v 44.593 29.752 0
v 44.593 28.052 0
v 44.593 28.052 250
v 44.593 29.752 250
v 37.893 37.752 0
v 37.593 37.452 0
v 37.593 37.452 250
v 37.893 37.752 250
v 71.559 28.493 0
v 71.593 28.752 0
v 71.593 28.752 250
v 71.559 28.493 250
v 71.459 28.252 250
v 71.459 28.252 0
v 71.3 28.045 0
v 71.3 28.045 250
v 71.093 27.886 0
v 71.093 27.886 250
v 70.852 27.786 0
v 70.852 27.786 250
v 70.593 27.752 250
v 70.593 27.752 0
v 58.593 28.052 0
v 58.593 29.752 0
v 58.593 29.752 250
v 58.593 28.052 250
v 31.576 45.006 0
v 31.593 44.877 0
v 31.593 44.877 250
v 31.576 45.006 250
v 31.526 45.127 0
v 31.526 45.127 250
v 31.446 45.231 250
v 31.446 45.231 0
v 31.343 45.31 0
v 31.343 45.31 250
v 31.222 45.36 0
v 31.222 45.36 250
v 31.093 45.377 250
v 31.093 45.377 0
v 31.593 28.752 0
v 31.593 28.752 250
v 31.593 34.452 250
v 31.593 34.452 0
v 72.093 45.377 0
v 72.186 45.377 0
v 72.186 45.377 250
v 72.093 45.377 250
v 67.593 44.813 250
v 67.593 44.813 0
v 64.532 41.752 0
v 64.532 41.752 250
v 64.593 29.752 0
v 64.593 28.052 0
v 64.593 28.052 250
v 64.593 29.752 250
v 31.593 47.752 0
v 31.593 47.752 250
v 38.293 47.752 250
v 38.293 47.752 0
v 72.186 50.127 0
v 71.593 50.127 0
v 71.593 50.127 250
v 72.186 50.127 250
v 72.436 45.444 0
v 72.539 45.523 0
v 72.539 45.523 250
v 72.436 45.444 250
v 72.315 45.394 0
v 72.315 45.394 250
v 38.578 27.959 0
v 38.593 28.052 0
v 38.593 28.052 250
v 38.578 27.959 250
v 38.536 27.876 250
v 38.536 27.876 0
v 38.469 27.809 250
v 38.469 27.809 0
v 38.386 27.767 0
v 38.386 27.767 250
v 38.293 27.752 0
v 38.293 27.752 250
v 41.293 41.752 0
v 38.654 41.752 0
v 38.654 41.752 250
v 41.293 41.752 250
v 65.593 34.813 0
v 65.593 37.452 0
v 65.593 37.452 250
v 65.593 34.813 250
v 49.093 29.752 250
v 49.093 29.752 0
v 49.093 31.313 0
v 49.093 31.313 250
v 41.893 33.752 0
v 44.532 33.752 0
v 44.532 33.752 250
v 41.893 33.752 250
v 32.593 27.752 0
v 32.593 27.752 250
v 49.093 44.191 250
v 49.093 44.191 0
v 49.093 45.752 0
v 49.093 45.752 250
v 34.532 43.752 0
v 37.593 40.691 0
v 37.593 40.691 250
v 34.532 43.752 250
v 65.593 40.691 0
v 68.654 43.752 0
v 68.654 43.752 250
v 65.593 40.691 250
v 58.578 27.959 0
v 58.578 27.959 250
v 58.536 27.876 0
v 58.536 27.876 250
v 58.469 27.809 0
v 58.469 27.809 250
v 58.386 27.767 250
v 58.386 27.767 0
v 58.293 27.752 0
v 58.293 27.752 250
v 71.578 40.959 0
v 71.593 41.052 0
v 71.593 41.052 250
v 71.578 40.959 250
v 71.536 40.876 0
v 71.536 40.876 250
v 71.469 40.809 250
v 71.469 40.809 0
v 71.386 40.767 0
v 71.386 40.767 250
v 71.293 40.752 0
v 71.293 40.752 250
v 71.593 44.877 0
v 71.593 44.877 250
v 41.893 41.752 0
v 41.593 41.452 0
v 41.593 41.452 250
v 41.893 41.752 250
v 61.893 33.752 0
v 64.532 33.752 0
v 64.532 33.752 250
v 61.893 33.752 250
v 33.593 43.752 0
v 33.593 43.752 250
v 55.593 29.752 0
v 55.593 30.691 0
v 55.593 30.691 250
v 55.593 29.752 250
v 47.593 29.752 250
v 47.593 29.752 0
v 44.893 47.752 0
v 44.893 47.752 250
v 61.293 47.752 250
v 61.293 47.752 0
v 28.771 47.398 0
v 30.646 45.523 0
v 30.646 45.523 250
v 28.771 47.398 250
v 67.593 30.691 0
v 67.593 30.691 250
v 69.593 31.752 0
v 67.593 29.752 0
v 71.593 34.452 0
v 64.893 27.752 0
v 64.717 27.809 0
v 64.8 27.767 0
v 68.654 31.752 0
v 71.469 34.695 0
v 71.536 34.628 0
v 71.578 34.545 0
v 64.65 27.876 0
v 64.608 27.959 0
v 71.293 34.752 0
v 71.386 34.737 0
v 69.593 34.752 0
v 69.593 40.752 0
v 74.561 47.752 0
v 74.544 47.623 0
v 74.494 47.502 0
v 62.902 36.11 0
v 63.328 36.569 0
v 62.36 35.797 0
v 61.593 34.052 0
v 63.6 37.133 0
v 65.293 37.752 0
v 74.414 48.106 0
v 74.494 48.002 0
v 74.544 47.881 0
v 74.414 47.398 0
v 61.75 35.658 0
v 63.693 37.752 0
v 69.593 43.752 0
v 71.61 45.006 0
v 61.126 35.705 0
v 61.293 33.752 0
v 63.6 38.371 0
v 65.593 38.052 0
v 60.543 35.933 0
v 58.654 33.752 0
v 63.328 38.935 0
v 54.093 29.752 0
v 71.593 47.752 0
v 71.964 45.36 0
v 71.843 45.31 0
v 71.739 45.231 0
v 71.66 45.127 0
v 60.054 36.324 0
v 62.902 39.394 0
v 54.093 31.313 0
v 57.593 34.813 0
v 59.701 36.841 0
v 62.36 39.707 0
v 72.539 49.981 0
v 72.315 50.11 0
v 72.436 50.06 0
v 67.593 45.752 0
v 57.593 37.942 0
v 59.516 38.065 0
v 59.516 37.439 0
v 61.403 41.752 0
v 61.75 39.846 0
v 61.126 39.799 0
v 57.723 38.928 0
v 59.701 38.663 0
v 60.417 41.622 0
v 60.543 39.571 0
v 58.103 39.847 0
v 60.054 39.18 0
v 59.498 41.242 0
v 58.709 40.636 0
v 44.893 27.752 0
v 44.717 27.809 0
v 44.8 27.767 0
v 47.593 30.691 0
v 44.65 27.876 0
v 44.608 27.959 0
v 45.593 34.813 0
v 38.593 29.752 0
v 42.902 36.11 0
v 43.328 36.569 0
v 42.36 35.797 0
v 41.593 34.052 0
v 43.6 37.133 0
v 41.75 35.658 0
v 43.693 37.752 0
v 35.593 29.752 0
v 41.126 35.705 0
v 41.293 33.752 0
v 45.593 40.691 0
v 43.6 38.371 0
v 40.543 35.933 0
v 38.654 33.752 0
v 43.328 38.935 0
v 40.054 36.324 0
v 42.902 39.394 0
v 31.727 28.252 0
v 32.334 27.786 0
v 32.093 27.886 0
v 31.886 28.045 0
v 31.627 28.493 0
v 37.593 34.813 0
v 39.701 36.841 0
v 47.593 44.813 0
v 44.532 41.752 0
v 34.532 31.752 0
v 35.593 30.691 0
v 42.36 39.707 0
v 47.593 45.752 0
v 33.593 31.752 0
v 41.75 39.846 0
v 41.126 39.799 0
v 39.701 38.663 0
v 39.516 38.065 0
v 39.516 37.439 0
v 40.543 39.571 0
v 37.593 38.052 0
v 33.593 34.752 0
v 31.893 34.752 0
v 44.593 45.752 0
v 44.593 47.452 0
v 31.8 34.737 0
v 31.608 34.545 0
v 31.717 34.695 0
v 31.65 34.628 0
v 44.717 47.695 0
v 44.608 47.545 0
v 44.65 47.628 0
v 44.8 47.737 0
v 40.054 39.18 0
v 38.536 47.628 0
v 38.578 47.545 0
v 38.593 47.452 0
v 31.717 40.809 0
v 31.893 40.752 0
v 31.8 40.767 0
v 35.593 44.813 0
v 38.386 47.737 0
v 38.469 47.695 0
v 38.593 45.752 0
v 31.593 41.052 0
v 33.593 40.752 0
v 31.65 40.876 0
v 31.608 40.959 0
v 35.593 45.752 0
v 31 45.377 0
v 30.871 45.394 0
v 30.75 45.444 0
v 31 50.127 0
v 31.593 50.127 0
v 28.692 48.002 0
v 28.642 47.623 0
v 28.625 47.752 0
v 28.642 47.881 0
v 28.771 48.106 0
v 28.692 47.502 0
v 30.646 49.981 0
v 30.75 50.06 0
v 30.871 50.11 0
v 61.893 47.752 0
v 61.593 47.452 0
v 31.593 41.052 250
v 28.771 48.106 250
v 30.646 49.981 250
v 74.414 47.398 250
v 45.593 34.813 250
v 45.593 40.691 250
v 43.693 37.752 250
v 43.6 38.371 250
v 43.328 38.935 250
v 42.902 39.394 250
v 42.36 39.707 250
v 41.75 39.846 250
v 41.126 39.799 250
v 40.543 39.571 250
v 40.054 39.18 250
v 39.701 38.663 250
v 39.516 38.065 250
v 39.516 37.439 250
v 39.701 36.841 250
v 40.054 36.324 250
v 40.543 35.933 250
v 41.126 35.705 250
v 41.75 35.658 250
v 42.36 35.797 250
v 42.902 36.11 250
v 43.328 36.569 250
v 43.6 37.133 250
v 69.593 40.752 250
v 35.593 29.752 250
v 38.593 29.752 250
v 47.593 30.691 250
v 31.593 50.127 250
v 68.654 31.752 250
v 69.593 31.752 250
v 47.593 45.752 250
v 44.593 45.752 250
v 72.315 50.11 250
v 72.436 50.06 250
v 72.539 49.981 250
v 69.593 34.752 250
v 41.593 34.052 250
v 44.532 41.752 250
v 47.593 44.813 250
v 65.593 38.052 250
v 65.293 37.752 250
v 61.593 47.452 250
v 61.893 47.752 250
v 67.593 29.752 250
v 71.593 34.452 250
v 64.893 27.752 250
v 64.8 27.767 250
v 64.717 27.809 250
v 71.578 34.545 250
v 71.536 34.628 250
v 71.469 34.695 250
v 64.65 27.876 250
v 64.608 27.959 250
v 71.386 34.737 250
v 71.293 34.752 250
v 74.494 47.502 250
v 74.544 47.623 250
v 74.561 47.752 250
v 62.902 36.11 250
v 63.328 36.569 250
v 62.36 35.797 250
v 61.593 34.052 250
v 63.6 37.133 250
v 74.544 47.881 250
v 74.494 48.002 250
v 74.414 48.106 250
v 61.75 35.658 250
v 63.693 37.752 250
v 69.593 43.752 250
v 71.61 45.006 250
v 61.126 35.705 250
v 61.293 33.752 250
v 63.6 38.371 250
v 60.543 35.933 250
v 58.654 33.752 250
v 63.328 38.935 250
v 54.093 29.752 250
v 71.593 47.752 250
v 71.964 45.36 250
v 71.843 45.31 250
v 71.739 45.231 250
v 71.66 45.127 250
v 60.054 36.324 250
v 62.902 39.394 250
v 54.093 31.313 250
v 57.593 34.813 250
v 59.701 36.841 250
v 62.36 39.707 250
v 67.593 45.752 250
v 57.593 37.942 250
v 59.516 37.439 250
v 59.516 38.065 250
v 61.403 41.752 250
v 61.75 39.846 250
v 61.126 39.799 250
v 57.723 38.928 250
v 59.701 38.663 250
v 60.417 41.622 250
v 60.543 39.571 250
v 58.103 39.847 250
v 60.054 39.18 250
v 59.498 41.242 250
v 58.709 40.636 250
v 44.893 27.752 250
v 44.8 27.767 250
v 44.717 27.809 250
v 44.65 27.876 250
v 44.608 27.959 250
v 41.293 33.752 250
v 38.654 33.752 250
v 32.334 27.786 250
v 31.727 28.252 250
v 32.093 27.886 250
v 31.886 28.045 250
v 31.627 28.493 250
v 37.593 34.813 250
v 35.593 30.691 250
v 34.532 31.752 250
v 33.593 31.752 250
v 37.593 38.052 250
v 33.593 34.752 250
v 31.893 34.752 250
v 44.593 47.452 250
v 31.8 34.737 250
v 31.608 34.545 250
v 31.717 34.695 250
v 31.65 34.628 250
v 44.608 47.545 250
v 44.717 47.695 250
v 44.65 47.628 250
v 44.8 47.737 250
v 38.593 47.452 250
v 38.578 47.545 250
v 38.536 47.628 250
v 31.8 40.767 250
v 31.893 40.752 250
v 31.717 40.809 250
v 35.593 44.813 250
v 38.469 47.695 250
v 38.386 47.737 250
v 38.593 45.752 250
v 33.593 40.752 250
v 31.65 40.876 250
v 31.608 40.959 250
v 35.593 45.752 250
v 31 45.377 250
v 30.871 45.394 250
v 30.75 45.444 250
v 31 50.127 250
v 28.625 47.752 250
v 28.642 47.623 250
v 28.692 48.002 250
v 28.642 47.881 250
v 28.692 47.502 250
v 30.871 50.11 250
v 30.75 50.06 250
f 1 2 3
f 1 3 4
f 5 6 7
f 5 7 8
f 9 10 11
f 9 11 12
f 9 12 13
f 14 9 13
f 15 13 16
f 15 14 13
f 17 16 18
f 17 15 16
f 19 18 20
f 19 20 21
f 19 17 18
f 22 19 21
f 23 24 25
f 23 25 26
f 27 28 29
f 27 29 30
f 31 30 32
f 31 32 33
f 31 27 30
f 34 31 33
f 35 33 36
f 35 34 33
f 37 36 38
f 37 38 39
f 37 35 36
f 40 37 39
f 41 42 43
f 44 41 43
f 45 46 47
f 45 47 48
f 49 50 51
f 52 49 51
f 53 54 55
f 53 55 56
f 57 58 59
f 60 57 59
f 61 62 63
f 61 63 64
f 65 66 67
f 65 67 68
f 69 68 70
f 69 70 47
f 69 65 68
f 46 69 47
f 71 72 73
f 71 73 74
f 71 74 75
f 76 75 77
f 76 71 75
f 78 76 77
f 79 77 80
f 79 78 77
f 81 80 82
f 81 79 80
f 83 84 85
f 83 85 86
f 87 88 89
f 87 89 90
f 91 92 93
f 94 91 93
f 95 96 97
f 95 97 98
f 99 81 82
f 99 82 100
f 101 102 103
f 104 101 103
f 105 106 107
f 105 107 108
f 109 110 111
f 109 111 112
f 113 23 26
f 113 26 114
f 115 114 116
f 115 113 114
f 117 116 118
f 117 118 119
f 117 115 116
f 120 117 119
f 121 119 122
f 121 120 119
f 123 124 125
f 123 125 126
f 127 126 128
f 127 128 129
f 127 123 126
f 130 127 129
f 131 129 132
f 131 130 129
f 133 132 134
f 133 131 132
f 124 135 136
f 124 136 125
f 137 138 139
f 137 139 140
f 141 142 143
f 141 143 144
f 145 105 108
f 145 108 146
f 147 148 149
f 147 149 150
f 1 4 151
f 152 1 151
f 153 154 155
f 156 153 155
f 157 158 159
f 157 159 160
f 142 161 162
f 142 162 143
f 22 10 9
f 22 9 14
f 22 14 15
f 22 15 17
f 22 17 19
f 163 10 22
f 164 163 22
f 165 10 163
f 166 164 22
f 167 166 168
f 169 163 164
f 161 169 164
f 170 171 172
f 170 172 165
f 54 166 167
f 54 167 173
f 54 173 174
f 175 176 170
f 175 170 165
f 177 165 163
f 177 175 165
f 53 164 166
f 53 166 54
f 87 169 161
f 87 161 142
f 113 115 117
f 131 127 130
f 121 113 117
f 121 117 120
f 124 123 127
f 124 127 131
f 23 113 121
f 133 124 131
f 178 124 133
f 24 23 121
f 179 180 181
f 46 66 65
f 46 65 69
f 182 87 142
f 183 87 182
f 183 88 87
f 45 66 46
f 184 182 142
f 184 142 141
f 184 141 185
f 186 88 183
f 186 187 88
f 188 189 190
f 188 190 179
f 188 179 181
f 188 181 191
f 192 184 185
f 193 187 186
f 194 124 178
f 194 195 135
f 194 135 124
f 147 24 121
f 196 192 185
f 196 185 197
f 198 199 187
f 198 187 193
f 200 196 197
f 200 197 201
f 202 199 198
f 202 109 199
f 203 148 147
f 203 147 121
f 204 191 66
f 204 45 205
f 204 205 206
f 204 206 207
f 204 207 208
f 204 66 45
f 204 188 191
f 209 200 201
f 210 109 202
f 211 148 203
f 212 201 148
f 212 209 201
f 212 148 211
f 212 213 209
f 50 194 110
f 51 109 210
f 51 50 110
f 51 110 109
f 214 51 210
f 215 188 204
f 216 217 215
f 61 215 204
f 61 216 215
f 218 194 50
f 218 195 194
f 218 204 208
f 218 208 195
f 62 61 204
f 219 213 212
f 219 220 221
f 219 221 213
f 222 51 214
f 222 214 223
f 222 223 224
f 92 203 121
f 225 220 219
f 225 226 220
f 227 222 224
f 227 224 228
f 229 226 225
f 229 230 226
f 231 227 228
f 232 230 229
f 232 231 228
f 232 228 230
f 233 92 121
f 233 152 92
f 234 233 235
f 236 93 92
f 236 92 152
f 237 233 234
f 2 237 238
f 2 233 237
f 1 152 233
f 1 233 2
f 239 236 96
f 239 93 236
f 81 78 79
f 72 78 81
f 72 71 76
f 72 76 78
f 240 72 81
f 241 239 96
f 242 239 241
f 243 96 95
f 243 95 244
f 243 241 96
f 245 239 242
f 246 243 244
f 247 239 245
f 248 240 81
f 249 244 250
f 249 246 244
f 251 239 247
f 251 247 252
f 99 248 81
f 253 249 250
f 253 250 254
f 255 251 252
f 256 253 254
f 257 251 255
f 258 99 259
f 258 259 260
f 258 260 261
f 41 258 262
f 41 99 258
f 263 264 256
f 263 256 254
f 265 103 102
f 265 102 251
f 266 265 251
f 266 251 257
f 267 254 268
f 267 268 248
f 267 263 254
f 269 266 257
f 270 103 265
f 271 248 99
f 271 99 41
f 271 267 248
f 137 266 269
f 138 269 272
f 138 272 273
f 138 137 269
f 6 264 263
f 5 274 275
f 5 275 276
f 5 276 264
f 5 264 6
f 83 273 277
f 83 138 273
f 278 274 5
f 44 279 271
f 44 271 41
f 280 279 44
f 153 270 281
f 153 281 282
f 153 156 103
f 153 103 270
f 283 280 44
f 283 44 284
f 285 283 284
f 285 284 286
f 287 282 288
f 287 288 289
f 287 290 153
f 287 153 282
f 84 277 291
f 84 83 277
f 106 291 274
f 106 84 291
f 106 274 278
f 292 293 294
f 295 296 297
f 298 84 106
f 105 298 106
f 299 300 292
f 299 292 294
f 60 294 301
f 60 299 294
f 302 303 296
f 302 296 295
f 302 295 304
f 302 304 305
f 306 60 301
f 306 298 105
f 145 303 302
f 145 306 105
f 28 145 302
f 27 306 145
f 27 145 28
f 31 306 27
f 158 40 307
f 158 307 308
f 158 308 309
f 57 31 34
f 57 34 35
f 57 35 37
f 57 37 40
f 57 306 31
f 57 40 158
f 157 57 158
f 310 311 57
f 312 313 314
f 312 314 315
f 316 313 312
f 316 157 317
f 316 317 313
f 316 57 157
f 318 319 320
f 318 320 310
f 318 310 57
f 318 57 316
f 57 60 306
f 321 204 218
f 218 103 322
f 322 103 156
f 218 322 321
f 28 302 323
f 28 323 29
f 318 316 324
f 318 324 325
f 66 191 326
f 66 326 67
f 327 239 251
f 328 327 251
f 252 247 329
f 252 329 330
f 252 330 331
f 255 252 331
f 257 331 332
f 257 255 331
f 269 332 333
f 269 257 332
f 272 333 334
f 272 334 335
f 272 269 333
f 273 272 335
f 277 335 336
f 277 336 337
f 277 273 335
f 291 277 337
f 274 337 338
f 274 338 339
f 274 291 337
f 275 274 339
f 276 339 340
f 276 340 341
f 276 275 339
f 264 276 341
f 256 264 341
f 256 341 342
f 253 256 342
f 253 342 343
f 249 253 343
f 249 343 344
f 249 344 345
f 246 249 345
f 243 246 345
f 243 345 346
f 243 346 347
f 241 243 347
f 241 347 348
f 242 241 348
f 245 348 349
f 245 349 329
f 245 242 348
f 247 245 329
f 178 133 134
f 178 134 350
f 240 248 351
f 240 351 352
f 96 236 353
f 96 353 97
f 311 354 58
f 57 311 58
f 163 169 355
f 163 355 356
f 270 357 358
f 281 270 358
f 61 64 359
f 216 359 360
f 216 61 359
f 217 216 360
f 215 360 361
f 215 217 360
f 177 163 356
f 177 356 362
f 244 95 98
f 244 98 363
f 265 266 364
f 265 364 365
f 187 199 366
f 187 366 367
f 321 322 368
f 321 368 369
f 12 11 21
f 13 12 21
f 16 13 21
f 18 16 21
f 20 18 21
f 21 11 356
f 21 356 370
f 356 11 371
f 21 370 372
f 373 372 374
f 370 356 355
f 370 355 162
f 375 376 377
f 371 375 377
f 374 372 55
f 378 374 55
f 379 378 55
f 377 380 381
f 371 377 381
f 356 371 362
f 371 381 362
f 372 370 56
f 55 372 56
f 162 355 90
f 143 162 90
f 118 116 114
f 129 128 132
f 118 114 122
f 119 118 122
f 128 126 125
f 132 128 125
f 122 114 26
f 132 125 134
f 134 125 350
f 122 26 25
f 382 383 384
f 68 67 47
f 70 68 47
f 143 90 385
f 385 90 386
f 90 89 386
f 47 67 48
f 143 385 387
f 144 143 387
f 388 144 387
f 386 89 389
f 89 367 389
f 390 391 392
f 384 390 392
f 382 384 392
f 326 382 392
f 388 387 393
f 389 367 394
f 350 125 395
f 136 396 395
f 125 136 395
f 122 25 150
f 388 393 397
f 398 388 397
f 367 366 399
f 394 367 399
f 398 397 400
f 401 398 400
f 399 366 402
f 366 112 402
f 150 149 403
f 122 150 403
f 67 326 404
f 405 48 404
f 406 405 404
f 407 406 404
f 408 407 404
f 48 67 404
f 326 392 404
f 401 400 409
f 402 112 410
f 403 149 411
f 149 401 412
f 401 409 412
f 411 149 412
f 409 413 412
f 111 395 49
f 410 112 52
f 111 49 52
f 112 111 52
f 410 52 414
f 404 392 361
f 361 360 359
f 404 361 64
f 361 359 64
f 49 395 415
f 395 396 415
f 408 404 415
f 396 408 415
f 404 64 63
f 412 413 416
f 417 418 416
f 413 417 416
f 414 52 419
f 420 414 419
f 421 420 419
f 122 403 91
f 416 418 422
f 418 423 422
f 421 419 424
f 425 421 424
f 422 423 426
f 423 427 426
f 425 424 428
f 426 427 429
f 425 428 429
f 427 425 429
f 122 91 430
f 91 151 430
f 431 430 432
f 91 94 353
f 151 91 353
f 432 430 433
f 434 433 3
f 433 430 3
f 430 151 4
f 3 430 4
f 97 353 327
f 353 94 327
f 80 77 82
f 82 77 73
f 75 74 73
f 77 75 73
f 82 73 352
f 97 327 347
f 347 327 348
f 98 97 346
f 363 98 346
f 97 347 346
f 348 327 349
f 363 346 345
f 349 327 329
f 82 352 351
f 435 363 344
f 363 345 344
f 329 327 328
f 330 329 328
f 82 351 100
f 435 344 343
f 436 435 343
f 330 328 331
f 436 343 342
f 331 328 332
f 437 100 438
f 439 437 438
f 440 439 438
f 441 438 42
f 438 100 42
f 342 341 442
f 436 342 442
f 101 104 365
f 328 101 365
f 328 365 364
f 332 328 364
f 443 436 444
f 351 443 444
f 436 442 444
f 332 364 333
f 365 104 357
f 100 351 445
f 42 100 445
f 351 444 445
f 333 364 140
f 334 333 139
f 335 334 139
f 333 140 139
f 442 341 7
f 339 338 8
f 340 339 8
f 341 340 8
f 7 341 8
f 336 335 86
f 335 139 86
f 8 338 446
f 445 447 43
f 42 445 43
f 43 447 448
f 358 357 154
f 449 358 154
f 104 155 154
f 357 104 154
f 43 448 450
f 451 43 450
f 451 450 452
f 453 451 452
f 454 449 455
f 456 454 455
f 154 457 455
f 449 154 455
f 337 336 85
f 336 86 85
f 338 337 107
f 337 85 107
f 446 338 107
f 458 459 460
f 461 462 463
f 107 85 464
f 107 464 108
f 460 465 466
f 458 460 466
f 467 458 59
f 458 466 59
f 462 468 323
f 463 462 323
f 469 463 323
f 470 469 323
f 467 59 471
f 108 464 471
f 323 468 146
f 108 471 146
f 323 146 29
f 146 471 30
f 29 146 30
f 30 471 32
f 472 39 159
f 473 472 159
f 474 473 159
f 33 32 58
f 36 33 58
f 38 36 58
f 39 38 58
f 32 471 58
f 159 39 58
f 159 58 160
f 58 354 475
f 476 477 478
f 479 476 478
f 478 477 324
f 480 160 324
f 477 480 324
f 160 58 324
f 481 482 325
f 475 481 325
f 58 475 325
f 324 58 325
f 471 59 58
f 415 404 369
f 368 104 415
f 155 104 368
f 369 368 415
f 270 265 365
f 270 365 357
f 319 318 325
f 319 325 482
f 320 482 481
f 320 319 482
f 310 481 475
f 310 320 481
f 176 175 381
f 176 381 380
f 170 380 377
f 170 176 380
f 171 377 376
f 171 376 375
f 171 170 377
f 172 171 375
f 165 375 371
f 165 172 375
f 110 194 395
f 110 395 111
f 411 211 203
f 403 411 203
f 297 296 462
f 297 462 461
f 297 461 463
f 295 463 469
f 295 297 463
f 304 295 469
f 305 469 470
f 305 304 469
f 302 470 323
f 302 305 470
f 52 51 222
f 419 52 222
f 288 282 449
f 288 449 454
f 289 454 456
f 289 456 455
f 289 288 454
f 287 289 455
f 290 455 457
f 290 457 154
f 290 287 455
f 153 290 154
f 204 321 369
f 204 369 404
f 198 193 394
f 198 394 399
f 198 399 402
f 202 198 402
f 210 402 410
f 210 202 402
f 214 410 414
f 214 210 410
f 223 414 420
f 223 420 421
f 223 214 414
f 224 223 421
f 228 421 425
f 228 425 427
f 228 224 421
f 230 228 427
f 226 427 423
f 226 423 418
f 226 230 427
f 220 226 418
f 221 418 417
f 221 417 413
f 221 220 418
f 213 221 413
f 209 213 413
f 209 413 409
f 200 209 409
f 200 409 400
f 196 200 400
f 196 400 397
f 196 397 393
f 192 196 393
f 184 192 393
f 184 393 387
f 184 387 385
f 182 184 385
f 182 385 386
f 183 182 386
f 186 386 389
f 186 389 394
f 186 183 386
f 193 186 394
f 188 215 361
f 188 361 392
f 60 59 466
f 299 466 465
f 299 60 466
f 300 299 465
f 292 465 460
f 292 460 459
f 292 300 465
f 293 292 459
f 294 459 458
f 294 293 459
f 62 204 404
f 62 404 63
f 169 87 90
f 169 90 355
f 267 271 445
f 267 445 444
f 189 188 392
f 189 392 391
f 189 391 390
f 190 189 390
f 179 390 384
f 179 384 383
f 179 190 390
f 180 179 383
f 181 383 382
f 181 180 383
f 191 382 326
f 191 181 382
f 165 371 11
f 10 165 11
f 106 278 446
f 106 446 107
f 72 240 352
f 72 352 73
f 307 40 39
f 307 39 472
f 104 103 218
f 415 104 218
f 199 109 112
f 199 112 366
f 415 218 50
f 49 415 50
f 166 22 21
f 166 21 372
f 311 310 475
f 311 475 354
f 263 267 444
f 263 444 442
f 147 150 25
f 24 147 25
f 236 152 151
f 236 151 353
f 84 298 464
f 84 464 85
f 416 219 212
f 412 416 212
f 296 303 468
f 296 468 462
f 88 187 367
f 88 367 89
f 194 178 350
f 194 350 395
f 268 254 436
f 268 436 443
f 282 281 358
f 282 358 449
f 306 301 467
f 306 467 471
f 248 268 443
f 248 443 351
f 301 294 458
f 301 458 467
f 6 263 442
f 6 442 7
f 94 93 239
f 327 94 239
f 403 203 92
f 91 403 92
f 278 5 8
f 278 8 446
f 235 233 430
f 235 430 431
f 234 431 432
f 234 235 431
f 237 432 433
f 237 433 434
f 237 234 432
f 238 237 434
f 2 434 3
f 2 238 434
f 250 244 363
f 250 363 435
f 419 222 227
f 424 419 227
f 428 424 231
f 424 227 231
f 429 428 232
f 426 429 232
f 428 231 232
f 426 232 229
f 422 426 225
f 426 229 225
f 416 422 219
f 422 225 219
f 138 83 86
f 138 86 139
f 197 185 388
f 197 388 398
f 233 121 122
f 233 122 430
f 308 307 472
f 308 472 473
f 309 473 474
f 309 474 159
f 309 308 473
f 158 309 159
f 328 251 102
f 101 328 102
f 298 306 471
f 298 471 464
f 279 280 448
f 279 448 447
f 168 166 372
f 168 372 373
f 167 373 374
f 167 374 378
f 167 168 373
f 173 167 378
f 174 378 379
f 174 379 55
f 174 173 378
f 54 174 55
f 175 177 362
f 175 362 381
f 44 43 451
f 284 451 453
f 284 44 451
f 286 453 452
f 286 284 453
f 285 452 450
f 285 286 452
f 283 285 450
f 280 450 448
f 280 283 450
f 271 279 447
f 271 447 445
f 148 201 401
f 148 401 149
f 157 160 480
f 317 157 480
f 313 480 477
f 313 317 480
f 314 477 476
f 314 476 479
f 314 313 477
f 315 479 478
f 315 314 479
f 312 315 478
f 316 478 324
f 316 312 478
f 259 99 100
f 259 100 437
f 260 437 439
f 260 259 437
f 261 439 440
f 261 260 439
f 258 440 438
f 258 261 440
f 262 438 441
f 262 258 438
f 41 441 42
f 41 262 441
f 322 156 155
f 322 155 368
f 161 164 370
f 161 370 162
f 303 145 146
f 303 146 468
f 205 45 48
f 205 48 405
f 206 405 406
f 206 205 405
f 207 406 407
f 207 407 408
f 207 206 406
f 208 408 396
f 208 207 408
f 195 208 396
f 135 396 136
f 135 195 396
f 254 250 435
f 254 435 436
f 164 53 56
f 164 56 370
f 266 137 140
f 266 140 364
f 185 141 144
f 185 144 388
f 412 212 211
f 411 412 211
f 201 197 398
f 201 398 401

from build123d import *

# Parameters (mm, degrees)
MODEL_R             = 2.100000001
BOSS_EXTRUDE1_DEPTH = 250


with BuildPart() as part:
    # Model → Boss-Extrude1 (new body)
    with BuildSketch(Plane.XY):
        with BuildLine():
            Line((28.771485975, 48.105572105), (30.646485975, 49.980572105))
            ThreePointArc((30.646485975, 49.980572105), (30.808697649, 50.08895848), (31.000039365, 50.127018713))
            Line((31.000039365, 50.127018713), (31.592932584, 50.127018713))
            Line((31.592932584, 50.127018713), (31.592932584, 47.752018713))
            Line((31.592932584, 47.752018713), (38.292932585, 47.752018713))
            ThreePointArc((38.292932585, 47.752018713), (38.505064619, 47.664150748), (38.592932584, 47.452018714))
            Line((38.592932584, 47.452018714), (38.592932584, 45.752018713))
            Line((38.592932584, 45.752018713), (35.592932585, 45.752018713))
            Line((35.592932585, 45.752018713), (35.592932585, 44.812678885))
            Line((35.592932585, 44.812678885), (38.653592756, 41.752018713))
            Line((38.653592756, 41.752018713), (41.292932583, 41.752018713))
            Line((41.292932583, 41.752018713), (41.592932584, 41.452018713))
            Line((41.592932584, 41.452018713), (41.892932586, 41.752018714))
            Line((41.892932586, 41.752018714), (44.532272412, 41.752018714))
            Line((44.532272412, 41.752018714), (47.592932584, 44.812678886))
            Line((47.592932584, 44.812678886), (47.592932584, 45.752018714))
            Line((47.592932584, 45.752018714), (44.592932584, 45.752018714))
            Line((44.592932584, 45.752018714), (44.592932584, 47.452018715))
            ThreePointArc((44.592932584, 47.452018715), (44.68080055, 47.664150749), (44.892932584, 47.752018715))
            Line((44.892932584, 47.752018715), (61.292932583, 47.752018715))
            Line((61.292932583, 47.752018715), (61.592932582, 47.452018715))
            Line((61.592932582, 47.452018715), (61.892932583, 47.752018716))
            Line((61.892932583, 47.752018716), (71.592932583, 47.752018716))
            Line((71.592932583, 47.752018716), (71.592932583, 50.127018711))
            Line((71.592932583, 50.127018711), (72.185825802, 50.127018711))
            ThreePointArc((72.185825802, 50.127018711), (72.377167518, 50.088958477), (72.539379192, 49.980572102))
            Line((72.539379192, 49.980572102), (74.414379192, 48.105572102))
            ThreePointArc((74.414379192, 48.105572102), (74.560825801, 47.752018712), (74.414379192, 47.398465322))
            Line((74.414379192, 47.398465322), (72.539379192, 45.523465322))
            ThreePointArc((72.539379192, 45.523465322), (72.377167518, 45.415078947), (72.185825802, 45.377018714))
            Line((72.185825802, 45.377018714), (72.092932582, 45.377018714))
            ThreePointArc((72.092932582, 45.377018714), (71.739379192, 45.230572103), (71.592932583, 44.877018713))
            Line((71.592932583, 44.877018713), (71.592932583, 41.052018712))
            ThreePointArc((71.592932583, 41.052018712), (71.505064617, 40.839886678), (71.292932581, 40.752018713))
            Line((71.292932581, 40.752018713), (69.592932583, 40.752018713))
            Line((69.592932583, 40.752018713), (69.592932583, 43.752018712))
            Line((69.592932583, 43.752018712), (68.653592755, 43.752018712))
            Line((68.653592755, 43.752018712), (65.592932583, 40.691358541))
            Line((65.592932583, 40.691358541), (65.592932583, 38.052018712))
            Line((65.592932583, 38.052018712), (65.292932584, 37.752018712))
            Line((65.292932584, 37.752018712), (65.592932583, 37.452018713))
            Line((65.592932583, 37.452018713), (65.592932583, 34.812678884))
            Line((65.592932583, 34.812678884), (68.653592755, 31.752018712))
            Line((68.653592755, 31.752018712), (69.592932583, 31.752018712))
            Line((69.592932583, 31.752018712), (69.592932583, 34.752018711))
            Line((69.592932583, 34.752018711), (71.292932581, 34.752018711))
            ThreePointArc((71.292932581, 34.752018711), (71.505064617, 34.664150747), (71.592932583, 34.452018712))
            Line((71.592932583, 34.452018712), (71.592932583, 28.75201871))
            ThreePointArc((71.592932583, 28.75201871), (71.300039364, 28.044911929), (70.592932582, 27.752018711))
            Line((70.592932582, 27.752018711), (64.892932582, 27.752018711))
            ThreePointArc((64.892932582, 27.752018711), (64.680800548, 27.839886676), (64.592932583, 28.05201871))
            Line((64.592932583, 28.05201871), (64.592932583, 29.752018711))
            Line((64.592932583, 29.752018711), (67.592932582, 29.752018711))
            Line((67.592932582, 29.752018711), (67.592932582, 30.69135854))
            Line((67.592932582, 30.69135854), (64.532272411, 33.752018711))
            Line((64.532272411, 33.752018711), (61.892932584, 33.752018711))
            Line((61.892932584, 33.752018711), (61.592932582, 34.052018713))
            Line((61.592932582, 34.052018713), (61.292932582, 33.752018712))
            Line((61.292932582, 33.752018712), (58.653592755, 33.752018712))
            Line((58.653592755, 33.752018712), (55.592932583, 30.691358541))
            Line((55.592932583, 30.691358541), (55.592932583, 29.752018713))
            Line((55.592932583, 29.752018713), (58.592932583, 29.752018713))
            Line((58.592932583, 29.752018713), (58.592932583, 28.052018712))
            ThreePointArc((58.592932583, 28.052018712), (58.505064617, 27.839886678), (58.292932583, 27.752018712))
            Line((58.292932583, 27.752018712), (44.892932584, 27.752018712))
            ThreePointArc((44.892932584, 27.752018712), (44.68080055, 27.839886678), (44.592932584, 28.052018712))
            Line((44.592932584, 28.052018712), (44.592932584, 29.752018713))
            Line((44.592932584, 29.752018713), (47.592932584, 29.752018713))
            Line((47.592932584, 29.752018713), (47.592932584, 30.691358541))
            Line((47.592932584, 30.691358541), (44.532272412, 33.752018712))
            Line((44.532272412, 33.752018712), (41.892932586, 33.752018712))
            Line((41.892932586, 33.752018712), (41.592932584, 34.052018714))
            Line((41.592932584, 34.052018714), (41.292932583, 33.752018714))
            Line((41.292932583, 33.752018714), (38.653592756, 33.752018714))
            Line((38.653592756, 33.752018714), (35.592932585, 30.691358542))
            Line((35.592932585, 30.691358542), (35.592932585, 29.752018714))
            Line((35.592932585, 29.752018714), (38.592932584, 29.752018714))
            Line((38.592932584, 29.752018714), (38.592932584, 28.052018713))
            ThreePointArc((38.592932584, 28.052018713), (38.505064619, 27.839886679), (38.292932585, 27.752018714))
            Line((38.292932585, 27.752018714), (32.592932585, 27.752018714))
            ThreePointArc((32.592932585, 27.752018714), (31.885825803, 28.044911931), (31.592932584, 28.752018713))
            Line((31.592932584, 28.752018713), (31.592932584, 34.452018715))
            ThreePointArc((31.592932584, 34.452018715), (31.68080055, 34.664150748), (31.892932583, 34.752018714))
            Line((31.892932583, 34.752018714), (33.592932584, 34.752018714))
            Line((33.592932584, 34.752018714), (33.592932584, 31.752018715))
            Line((33.592932584, 31.752018715), (34.532272412, 31.752018715))
            Line((34.532272412, 31.752018715), (37.592932584, 34.812678886))
            Line((37.592932584, 34.812678886), (37.592932584, 37.452018715))
            Line((37.592932584, 37.452018715), (37.892932583, 37.752018715))
            Line((37.892932583, 37.752018715), (37.592932584, 38.052018714))
            Line((37.592932584, 38.052018714), (37.592932584, 40.691358543))
            Line((37.592932584, 40.691358543), (34.532272412, 43.752018715))
            Line((34.532272412, 43.752018715), (33.592932584, 43.752018715))
            Line((33.592932584, 43.752018715), (33.592932584, 40.752018716))
            Line((33.592932584, 40.752018716), (31.892932586, 40.752018716))
            ThreePointArc((31.892932586, 40.752018716), (31.68080055, 40.83988668), (31.592932584, 41.052018715))
            Line((31.592932584, 41.052018715), (31.592932584, 44.877018715))
            ThreePointArc((31.592932584, 44.877018715), (31.446485975, 45.230572106), (31.092932585, 45.377018716))
            Line((31.092932585, 45.377018716), (31.000039365, 45.377018716))
            ThreePointArc((31.000039365, 45.377018716), (30.808697649, 45.41507895), (30.646485975, 45.523465324))
            Line((30.646485975, 45.523465324), (28.771485975, 47.398465325))
            ThreePointArc((28.771485975, 47.398465325), (28.625039366, 47.752018715), (28.771485975, 48.105572105))
        make_face()
        with Locations((61.592932582, 37.752018715)):
            Circle(MODEL_R, mode=Mode.SUBTRACT)
        with Locations((41.592932582, 37.752018715)):
            Circle(MODEL_R, mode=Mode.SUBTRACT)
        with BuildLine():
            Line((54.092932584, 29.752018715), (49.092932584, 29.752018715))
            Line((49.092932584, 29.752018715), (49.092932584, 31.312678886))
            Line((49.092932584, 31.312678886), (45.592932583, 34.812678886))
            Line((45.592932583, 34.812678886), (45.592932583, 40.691358543))
            Line((45.592932583, 40.691358543), (49.092932584, 44.191358544))
            Line((49.092932584, 44.191358544), (49.092932584, 45.752018714))
            Line((49.092932584, 45.752018714), (67.592932582, 45.752018714))
            Line((67.592932582, 45.752018714), (67.592932582, 44.812678887))
            Line((67.592932582, 44.812678887), (64.532272411, 41.752018716))
            Line((64.532272411, 41.752018716), (61.402932584, 41.752018716))
            ThreePointArc((61.402932584, 41.752018716), (58.708855747, 40.636095552), (57.592932584, 37.942018716))
            Line((57.592932584, 37.942018716), (57.592932584, 34.812678886))
            Line((57.592932584, 34.812678886), (54.092932584, 31.312678886))
            Line((54.092932584, 31.312678886), (54.092932584, 29.752018715))
        make_face(mode=Mode.SUBTRACT)
    extrude(amount=BOSS_EXTRUDE1_DEPTH)


solid = part.part
